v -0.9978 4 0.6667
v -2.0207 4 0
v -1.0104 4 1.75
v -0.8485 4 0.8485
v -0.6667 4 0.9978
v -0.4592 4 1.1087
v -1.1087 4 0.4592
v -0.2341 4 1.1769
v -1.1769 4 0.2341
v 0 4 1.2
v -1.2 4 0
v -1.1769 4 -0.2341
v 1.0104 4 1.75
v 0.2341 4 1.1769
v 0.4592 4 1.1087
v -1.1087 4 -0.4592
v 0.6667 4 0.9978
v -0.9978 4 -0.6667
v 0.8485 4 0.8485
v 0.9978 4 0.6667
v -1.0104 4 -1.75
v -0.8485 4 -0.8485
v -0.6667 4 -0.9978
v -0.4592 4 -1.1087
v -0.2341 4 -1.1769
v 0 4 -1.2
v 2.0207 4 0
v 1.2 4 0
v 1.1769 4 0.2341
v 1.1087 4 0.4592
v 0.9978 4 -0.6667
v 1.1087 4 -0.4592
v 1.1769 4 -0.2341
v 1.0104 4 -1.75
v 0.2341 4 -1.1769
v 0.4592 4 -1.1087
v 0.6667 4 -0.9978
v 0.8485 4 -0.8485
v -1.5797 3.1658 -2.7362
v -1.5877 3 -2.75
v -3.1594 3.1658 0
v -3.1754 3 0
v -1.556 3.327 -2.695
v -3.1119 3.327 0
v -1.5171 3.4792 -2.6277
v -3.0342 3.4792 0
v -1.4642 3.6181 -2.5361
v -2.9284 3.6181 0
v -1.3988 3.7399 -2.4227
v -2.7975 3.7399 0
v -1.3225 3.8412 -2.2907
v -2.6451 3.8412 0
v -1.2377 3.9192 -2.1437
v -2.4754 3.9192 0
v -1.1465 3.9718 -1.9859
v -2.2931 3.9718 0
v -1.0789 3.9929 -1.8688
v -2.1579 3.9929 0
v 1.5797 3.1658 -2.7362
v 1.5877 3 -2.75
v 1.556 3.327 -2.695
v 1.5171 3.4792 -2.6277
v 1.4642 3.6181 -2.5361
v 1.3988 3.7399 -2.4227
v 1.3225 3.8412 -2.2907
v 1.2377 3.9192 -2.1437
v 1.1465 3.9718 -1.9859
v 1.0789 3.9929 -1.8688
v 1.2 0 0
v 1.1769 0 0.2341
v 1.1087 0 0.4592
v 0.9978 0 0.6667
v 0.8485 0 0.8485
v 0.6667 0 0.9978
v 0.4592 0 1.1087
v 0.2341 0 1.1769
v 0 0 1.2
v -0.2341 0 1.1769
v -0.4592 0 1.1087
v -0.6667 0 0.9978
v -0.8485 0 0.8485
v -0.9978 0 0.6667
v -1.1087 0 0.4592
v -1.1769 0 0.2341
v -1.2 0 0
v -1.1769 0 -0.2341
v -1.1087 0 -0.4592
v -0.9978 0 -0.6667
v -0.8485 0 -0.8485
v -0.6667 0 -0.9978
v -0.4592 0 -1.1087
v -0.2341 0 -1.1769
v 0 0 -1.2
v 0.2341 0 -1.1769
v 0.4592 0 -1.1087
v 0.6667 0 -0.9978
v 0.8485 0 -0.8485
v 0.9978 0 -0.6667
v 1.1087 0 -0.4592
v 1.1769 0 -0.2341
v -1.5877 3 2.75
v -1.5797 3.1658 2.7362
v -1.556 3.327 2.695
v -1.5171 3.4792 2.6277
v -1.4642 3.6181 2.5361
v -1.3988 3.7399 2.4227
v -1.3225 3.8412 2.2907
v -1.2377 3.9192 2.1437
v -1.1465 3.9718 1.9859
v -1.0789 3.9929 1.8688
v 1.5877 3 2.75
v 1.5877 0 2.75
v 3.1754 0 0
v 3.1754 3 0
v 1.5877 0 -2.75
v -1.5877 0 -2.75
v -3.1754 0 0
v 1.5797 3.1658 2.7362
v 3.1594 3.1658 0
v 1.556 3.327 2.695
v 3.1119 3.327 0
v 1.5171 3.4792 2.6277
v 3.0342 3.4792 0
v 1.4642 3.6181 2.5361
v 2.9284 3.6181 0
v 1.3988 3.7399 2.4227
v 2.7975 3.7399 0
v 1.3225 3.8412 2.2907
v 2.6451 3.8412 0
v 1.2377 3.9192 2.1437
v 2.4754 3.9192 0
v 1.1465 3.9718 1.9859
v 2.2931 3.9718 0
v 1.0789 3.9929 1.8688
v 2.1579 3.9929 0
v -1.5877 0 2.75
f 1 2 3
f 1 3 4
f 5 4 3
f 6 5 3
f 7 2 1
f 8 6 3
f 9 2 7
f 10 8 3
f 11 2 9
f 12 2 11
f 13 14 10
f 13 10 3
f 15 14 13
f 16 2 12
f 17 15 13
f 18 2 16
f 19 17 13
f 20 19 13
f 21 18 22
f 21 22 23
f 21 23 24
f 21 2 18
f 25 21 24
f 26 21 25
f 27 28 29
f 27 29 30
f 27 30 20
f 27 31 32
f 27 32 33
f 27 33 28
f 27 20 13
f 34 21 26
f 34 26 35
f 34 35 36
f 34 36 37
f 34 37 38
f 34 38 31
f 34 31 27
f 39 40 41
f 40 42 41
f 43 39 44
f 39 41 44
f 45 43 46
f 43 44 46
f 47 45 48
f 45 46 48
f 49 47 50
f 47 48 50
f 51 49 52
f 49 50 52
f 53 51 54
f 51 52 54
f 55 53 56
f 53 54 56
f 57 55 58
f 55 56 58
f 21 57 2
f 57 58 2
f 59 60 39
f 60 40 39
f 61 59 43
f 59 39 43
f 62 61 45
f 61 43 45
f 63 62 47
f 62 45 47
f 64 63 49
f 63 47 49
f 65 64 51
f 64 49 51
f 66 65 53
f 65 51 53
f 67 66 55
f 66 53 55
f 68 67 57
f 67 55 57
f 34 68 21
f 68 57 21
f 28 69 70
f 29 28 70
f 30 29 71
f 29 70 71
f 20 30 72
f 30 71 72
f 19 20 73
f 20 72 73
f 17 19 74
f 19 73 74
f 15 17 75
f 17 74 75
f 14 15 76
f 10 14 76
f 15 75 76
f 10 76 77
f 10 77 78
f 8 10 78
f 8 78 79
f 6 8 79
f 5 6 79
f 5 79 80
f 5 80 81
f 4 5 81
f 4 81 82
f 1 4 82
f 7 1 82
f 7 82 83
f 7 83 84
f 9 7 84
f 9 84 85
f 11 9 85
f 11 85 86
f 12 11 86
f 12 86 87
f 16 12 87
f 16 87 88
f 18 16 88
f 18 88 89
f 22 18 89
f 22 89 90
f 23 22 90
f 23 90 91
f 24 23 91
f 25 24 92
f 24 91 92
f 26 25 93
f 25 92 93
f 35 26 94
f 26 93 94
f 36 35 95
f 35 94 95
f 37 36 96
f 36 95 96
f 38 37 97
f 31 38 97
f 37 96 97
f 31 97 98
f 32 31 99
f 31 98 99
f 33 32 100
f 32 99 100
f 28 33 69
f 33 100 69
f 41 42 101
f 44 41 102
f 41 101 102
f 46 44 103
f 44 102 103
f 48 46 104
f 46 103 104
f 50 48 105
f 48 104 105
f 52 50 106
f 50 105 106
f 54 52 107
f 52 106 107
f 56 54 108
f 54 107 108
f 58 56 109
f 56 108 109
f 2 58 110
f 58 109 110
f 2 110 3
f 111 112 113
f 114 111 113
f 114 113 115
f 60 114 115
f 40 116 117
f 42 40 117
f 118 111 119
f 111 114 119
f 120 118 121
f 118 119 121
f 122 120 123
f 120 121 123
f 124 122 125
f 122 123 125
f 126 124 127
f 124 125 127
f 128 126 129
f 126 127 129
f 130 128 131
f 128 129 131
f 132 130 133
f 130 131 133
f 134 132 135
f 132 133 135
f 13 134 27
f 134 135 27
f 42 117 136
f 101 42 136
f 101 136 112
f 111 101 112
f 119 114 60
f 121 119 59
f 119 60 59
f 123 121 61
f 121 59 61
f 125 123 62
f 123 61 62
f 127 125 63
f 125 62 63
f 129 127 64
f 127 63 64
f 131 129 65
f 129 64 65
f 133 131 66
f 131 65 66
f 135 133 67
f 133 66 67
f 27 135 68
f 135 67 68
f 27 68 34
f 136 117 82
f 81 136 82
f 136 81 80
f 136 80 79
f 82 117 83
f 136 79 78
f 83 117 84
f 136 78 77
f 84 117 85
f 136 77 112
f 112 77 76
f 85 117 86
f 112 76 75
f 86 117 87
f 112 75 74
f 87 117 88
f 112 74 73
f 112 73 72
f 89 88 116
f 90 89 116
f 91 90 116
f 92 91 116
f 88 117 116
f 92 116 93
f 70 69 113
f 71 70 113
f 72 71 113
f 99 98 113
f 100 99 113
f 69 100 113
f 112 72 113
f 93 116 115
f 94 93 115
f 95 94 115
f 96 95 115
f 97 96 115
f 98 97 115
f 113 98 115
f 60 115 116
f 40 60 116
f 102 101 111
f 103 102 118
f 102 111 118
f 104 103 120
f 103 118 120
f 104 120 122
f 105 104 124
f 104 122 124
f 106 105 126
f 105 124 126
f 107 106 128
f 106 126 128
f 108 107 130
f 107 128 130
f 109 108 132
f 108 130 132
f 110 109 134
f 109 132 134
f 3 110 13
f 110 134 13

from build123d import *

# Parameters (mm, degrees)
BOSS_EXTRUDE2_DEPTH = 4
FILLET1_R           = 1
SKETCH3_R           = 1.2
CUT_EXTRUDE1_DEPTH  = 5


with BuildPart() as part:
    # Sketch2 → Boss-Extrude2 (new body)
    with BuildSketch(Plane(origin=(0, 0, 0), x_dir=(1, 0, 0), z_dir=(0, 1, 0))):
        Polygon((3.175426481, 0), (1.58771324, 2.75), (-1.58771324, 2.75), (-3.175426481, 0), (-1.58771324, -2.75), (1.58771324, -2.75), align=None)
    extrude(amount=BOSS_EXTRUDE2_DEPTH)

    # Fillet1
    fillet1_edges = [part.edges().sort_by_distance(p)[0] for p in [
        (0, 4, -2.75),
        (-2.38156986, 4, -1.375),
        (-2.38156986, 4, 1.375),
        (0, 4, 2.75),
        (2.38156986, 4, 1.375),
        (2.38156986, 4, -1.375),
    ]]
    fillet(fillet1_edges, radius=FILLET1_R)

    # Sketch3 → Cut-Extrude1 (cut, through all)
    with BuildSketch(Plane.XZ):
        Circle(SKETCH3_R)
    extrude(amount=-CUT_EXTRUDE1_DEPTH, mode=Mode.SUBTRACT)


solid = part.part
